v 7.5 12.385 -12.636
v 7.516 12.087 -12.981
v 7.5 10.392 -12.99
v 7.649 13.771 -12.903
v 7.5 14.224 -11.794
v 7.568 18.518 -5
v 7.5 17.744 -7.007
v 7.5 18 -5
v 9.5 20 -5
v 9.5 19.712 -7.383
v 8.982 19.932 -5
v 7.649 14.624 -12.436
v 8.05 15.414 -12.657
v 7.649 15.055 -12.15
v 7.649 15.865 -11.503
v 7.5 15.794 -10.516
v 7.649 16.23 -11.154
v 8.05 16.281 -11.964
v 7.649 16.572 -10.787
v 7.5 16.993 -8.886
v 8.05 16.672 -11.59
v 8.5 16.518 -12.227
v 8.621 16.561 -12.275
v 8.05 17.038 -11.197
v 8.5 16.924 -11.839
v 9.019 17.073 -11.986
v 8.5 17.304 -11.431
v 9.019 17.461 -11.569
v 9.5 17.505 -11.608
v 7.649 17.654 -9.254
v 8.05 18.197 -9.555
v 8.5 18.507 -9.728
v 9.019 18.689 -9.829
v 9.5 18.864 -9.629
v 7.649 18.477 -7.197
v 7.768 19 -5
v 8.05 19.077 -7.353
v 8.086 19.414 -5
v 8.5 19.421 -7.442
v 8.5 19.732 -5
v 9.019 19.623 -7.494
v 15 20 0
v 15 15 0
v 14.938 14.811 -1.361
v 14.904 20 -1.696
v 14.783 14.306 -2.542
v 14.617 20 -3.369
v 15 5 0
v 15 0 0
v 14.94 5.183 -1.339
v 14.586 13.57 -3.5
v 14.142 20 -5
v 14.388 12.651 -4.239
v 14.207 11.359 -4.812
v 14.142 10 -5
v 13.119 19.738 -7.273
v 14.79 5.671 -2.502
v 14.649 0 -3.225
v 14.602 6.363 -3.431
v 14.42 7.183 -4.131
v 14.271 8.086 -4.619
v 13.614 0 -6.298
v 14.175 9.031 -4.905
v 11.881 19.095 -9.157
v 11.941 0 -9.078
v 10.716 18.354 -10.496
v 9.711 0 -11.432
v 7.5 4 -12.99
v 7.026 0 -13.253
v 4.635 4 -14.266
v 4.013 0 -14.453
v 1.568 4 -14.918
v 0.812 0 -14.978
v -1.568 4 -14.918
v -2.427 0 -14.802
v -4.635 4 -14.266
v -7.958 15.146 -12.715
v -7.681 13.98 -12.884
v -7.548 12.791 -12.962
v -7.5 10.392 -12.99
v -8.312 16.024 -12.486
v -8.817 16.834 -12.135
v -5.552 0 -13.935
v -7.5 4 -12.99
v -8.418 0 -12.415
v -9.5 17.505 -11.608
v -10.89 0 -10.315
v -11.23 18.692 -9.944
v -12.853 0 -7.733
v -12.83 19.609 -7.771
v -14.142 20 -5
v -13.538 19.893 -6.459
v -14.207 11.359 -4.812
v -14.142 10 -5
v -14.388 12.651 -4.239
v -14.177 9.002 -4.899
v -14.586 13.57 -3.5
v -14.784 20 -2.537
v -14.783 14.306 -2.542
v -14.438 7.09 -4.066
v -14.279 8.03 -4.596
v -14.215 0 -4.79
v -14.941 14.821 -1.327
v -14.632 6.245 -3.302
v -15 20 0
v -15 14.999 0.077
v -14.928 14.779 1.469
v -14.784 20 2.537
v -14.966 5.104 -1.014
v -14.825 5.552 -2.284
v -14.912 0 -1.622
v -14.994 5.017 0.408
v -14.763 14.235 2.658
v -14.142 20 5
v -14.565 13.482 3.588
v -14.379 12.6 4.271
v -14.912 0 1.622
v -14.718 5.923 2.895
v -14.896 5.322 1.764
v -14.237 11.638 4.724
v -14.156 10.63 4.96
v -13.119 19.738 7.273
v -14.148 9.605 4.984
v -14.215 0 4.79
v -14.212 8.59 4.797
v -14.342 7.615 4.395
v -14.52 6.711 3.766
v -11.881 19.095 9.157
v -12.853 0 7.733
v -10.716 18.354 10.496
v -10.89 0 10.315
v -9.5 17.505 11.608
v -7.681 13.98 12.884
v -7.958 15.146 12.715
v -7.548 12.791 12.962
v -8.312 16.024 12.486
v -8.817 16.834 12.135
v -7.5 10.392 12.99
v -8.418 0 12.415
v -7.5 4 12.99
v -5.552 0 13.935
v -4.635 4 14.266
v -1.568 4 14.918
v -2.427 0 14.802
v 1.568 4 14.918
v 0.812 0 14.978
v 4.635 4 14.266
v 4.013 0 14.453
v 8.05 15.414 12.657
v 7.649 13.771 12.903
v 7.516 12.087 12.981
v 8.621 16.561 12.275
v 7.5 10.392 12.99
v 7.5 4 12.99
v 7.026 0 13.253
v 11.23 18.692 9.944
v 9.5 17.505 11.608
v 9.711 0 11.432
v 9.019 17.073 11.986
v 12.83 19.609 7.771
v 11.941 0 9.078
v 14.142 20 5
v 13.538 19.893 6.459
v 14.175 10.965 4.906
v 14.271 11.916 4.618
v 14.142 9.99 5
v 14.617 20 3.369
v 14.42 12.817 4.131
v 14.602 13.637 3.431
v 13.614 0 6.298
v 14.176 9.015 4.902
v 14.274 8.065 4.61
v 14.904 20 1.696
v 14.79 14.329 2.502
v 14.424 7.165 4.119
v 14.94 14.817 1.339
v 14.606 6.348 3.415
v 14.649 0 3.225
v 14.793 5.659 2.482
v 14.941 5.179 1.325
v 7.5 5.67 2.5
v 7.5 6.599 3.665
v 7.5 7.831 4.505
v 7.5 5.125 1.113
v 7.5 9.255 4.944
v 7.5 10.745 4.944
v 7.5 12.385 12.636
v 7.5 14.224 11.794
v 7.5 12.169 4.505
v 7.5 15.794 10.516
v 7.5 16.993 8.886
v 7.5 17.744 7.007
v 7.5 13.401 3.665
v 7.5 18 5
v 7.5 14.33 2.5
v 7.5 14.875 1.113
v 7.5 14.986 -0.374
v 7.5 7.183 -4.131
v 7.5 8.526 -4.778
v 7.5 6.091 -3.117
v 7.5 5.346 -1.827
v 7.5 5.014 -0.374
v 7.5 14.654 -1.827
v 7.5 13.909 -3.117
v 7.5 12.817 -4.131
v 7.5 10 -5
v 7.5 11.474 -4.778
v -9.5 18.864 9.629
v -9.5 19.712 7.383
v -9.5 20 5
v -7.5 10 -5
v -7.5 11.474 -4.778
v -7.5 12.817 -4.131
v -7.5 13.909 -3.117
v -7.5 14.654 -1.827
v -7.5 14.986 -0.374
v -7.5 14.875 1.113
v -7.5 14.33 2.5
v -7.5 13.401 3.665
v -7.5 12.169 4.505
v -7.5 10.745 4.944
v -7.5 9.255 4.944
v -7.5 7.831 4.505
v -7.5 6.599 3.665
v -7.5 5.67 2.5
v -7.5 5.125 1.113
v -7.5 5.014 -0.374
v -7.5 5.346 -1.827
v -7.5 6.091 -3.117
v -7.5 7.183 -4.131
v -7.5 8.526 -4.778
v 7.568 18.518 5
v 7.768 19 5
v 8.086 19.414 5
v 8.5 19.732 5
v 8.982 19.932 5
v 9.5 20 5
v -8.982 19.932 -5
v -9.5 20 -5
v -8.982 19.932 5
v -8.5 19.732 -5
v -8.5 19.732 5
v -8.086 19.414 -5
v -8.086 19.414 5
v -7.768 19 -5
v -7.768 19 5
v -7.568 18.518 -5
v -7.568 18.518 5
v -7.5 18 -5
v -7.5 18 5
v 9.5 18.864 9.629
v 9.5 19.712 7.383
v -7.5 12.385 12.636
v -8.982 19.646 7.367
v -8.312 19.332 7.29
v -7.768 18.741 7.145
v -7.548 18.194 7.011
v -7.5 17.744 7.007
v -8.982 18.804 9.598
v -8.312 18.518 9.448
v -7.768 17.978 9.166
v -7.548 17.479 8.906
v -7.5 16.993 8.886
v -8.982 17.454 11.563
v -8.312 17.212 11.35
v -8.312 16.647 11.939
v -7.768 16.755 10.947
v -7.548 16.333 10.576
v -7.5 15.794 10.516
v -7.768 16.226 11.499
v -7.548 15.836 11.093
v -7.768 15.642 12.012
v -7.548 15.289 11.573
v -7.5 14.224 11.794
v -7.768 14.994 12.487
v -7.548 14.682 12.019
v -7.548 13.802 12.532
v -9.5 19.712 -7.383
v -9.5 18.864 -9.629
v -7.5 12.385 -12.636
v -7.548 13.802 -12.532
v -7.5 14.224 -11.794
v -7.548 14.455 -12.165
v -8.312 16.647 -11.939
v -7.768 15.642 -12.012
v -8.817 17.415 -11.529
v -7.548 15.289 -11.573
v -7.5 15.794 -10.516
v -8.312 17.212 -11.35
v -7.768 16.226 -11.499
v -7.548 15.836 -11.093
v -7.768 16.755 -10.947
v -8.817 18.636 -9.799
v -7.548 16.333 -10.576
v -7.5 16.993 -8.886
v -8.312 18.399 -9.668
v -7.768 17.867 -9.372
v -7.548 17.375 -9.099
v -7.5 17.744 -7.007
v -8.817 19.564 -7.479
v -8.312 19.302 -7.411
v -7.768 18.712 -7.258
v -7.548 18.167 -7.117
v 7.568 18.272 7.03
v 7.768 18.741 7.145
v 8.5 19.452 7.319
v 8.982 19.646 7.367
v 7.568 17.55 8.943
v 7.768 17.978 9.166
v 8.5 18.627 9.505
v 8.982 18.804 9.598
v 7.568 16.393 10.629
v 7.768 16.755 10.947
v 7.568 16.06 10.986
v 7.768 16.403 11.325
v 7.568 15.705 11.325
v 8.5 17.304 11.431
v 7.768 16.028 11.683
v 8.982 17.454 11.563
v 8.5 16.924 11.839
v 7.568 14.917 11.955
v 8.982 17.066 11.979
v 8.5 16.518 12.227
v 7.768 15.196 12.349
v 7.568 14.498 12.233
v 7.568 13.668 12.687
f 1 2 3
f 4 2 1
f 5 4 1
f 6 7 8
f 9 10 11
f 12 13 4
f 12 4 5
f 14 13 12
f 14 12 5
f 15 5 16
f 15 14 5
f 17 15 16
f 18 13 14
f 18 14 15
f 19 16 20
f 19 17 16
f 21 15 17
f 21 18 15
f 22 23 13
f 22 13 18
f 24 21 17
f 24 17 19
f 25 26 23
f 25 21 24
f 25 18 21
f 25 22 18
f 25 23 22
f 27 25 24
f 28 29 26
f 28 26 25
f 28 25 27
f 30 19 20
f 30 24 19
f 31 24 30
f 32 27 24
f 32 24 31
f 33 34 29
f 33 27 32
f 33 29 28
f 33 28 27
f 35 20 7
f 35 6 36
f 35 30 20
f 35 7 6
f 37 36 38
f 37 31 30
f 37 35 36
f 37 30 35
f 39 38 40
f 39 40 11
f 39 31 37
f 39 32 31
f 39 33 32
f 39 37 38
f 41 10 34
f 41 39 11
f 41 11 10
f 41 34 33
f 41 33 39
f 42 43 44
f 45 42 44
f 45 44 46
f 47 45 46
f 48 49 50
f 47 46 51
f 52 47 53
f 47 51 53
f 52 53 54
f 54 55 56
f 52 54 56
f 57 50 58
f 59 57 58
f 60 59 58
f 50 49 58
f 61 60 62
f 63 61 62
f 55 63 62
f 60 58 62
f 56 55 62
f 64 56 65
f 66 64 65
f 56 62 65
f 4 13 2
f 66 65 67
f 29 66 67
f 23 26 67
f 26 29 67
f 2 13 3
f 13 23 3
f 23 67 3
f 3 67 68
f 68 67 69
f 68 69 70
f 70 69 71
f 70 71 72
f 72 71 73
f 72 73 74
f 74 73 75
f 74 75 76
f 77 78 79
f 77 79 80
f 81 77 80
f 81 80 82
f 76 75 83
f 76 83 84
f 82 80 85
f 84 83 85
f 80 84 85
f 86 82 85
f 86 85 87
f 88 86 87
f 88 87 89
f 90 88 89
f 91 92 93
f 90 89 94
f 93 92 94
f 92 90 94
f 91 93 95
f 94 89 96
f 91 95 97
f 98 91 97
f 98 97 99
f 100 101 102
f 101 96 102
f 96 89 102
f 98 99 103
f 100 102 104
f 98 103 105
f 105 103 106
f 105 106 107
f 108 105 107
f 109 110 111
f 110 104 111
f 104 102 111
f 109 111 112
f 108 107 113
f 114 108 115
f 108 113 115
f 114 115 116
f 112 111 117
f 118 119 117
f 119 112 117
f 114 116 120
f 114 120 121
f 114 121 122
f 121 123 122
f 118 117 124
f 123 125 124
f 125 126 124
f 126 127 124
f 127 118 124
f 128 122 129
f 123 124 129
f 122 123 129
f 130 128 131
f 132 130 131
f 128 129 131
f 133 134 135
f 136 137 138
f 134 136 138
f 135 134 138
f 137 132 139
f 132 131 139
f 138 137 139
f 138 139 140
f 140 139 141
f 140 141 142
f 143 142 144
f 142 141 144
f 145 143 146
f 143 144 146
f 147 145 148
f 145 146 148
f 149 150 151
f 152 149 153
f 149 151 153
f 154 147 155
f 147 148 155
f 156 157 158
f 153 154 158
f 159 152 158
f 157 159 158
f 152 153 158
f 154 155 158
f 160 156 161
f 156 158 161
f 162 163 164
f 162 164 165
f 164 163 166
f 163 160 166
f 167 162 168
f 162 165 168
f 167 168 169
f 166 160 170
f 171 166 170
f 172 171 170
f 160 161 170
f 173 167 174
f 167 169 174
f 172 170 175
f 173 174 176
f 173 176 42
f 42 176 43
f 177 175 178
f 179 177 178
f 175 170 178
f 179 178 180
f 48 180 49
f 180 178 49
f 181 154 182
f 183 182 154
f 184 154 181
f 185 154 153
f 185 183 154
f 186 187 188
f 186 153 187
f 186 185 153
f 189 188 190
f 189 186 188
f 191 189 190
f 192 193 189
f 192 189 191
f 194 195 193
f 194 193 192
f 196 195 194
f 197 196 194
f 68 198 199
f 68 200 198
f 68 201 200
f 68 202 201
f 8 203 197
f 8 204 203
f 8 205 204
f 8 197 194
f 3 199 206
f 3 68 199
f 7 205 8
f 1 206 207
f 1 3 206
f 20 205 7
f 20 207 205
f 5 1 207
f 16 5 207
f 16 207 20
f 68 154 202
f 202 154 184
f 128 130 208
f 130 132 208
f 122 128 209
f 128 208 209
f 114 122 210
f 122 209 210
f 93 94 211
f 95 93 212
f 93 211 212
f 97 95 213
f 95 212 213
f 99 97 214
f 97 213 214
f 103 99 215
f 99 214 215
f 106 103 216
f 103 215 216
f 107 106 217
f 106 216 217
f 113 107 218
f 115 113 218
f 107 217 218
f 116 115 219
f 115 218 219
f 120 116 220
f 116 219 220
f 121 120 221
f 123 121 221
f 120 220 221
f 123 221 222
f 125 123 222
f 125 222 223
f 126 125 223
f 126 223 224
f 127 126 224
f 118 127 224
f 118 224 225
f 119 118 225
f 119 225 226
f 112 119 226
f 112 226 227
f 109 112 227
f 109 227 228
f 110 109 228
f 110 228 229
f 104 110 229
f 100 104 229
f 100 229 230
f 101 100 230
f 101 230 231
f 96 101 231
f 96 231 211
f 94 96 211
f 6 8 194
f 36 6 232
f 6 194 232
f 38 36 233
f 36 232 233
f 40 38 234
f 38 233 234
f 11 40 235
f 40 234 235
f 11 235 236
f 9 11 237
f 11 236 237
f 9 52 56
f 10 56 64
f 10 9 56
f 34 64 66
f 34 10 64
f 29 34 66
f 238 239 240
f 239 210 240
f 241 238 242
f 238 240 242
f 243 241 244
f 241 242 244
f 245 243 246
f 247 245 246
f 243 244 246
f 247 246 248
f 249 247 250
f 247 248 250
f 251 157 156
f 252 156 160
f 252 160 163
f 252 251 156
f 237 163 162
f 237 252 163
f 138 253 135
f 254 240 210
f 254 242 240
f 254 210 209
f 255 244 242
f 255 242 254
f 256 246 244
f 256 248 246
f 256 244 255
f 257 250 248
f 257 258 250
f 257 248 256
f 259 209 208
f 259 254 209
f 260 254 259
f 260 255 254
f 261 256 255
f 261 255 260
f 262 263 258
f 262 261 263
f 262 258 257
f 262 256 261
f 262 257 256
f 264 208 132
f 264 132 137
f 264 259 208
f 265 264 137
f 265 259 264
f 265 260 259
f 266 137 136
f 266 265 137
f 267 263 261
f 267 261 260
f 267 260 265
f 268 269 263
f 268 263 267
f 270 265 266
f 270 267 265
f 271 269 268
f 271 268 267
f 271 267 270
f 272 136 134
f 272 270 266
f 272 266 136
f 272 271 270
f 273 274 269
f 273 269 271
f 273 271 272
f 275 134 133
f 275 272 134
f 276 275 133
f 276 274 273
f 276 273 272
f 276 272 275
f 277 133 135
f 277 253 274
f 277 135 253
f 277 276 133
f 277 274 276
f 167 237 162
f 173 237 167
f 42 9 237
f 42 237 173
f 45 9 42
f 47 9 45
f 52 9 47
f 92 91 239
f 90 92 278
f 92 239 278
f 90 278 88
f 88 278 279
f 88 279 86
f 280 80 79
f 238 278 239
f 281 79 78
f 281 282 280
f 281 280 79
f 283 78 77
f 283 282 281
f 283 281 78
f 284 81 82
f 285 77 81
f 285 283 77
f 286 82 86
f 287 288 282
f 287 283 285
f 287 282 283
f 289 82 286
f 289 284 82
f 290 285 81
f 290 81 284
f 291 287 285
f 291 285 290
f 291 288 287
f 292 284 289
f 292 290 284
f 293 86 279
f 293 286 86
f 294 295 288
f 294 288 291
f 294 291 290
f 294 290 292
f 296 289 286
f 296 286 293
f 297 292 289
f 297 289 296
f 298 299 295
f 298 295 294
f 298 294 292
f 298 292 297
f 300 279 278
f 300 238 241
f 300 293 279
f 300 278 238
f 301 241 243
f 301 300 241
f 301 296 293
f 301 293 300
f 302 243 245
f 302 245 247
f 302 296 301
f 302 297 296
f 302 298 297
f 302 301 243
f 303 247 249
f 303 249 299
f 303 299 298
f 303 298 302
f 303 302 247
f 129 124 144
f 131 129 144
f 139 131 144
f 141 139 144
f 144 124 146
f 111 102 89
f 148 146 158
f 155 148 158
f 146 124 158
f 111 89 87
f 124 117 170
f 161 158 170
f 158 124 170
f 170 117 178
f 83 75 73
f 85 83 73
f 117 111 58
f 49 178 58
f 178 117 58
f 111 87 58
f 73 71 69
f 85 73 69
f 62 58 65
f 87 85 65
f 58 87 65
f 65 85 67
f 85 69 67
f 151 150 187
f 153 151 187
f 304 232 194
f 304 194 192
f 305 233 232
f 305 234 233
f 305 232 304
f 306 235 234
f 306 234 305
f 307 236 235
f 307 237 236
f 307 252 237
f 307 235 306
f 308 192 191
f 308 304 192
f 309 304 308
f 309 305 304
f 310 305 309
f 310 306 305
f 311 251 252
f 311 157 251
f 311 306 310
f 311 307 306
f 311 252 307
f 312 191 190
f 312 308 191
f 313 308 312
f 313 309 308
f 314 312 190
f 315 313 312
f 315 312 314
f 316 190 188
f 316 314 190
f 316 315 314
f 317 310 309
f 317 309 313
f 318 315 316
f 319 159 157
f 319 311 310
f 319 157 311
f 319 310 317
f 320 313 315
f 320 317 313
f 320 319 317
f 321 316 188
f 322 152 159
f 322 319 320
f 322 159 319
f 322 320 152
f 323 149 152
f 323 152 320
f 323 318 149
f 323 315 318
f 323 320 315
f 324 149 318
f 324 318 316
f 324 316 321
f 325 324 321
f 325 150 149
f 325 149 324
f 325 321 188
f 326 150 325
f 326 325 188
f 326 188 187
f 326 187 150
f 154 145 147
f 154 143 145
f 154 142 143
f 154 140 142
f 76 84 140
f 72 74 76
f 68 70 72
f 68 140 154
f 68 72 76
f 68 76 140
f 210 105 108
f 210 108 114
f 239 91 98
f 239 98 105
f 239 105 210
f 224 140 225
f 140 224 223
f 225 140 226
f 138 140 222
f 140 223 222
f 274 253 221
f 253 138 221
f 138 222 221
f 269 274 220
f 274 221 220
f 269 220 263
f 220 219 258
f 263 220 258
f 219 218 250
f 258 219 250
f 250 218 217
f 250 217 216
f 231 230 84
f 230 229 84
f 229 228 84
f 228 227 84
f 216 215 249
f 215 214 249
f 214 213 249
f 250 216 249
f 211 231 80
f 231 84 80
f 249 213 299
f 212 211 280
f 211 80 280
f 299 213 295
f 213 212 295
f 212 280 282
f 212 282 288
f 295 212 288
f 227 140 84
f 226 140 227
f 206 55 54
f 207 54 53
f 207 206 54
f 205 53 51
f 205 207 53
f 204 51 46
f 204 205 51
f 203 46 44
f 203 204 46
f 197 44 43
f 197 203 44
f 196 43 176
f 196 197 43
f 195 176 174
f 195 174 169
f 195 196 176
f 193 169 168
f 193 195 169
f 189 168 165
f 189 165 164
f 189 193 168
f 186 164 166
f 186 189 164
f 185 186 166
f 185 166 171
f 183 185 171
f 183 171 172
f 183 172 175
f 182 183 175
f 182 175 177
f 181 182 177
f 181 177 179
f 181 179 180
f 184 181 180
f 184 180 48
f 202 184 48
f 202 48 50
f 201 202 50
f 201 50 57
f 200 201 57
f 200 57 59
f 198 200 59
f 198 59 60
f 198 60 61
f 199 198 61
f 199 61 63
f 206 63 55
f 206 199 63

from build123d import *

# Parameters (mm, degrees)
SKETCH1_R               = 15
BOSS_EXTRUDE1_DEPTH     = 20
SKETCH2_R               = 5
CUT_EXTRUDE1_DEPTH      = 16
CUT_EXTRUDE1_DEPTH_BACK = 16
SKETCH3_W               = 15
SKETCH3_H               = 16
CUT_EXTRUDE2_DEPTH      = 16.0000001
CUT_EXTRUDE2_DEPTH_BACK = 16.0000001
FILLET1_R               = 2


with BuildPart() as part:
    # Sketch1 → Boss-Extrude1 (new body)
    with BuildSketch(Plane(origin=(0, 0, 0), x_dir=(1, 0, 0), z_dir=(0, 1, 0))):
        Circle(SKETCH1_R)
    extrude(amount=BOSS_EXTRUDE1_DEPTH)

    # Sketch2 → Cut-Extrude1 (cut, two sides)
    with BuildSketch(Plane(origin=(0, 0, 0), x_dir=(0, 0, -1), z_dir=(1, 0, 0))) as cut_extrude1_sk:
        with BuildLine():
            ThreePointArc((-15, 10), (-12.071067812, 17.071067812), (-5, 20))
            Line((-5, 20), (-15, 20))
            Line((-15, 20), (-15, 10))
        make_face()
        with BuildLine():
            Line((15, 20), (5, 20))
            ThreePointArc((5, 20), (12.071067812, 17.071067812), (15, 10))
            Line((15, 10), (15, 20))
        make_face()
        with Locations((0, 10)):
            Circle(SKETCH2_R)
    extrude(amount=CUT_EXTRUDE1_DEPTH, mode=Mode.SUBTRACT)
    extrude(cut_extrude1_sk.sketch, amount=-CUT_EXTRUDE1_DEPTH_BACK, mode=Mode.SUBTRACT)

    # Sketch3 → Cut-Extrude2 (cut, two sides)
    with BuildSketch(Plane.XY) as cut_extrude2_sk:
        with Locations((0, 12)):
            Rectangle(SKETCH3_W, SKETCH3_H)
    extrude(amount=CUT_EXTRUDE2_DEPTH, mode=Mode.SUBTRACT)
    extrude(cut_extrude2_sk.sketch, amount=-CUT_EXTRUDE2_DEPTH_BACK, mode=Mode.SUBTRACT)

    # Fillet1
    fillet1_edges = [part.edges().sort_by_distance(p)[0] for p in [
        (7.5, 20, 0),
        (-7.5, 20, 0),
        (7.5, 18.947849992, -9.464972622),
        (7.5, 18.94784999, 9.464972627),
        (-7.5, 18.94784999, -9.464972627),
        (-7.5, 18.947849992, 9.464972622),
    ]]
    fillet(fillet1_edges, radius=FILLET1_R)


solid = part.part
